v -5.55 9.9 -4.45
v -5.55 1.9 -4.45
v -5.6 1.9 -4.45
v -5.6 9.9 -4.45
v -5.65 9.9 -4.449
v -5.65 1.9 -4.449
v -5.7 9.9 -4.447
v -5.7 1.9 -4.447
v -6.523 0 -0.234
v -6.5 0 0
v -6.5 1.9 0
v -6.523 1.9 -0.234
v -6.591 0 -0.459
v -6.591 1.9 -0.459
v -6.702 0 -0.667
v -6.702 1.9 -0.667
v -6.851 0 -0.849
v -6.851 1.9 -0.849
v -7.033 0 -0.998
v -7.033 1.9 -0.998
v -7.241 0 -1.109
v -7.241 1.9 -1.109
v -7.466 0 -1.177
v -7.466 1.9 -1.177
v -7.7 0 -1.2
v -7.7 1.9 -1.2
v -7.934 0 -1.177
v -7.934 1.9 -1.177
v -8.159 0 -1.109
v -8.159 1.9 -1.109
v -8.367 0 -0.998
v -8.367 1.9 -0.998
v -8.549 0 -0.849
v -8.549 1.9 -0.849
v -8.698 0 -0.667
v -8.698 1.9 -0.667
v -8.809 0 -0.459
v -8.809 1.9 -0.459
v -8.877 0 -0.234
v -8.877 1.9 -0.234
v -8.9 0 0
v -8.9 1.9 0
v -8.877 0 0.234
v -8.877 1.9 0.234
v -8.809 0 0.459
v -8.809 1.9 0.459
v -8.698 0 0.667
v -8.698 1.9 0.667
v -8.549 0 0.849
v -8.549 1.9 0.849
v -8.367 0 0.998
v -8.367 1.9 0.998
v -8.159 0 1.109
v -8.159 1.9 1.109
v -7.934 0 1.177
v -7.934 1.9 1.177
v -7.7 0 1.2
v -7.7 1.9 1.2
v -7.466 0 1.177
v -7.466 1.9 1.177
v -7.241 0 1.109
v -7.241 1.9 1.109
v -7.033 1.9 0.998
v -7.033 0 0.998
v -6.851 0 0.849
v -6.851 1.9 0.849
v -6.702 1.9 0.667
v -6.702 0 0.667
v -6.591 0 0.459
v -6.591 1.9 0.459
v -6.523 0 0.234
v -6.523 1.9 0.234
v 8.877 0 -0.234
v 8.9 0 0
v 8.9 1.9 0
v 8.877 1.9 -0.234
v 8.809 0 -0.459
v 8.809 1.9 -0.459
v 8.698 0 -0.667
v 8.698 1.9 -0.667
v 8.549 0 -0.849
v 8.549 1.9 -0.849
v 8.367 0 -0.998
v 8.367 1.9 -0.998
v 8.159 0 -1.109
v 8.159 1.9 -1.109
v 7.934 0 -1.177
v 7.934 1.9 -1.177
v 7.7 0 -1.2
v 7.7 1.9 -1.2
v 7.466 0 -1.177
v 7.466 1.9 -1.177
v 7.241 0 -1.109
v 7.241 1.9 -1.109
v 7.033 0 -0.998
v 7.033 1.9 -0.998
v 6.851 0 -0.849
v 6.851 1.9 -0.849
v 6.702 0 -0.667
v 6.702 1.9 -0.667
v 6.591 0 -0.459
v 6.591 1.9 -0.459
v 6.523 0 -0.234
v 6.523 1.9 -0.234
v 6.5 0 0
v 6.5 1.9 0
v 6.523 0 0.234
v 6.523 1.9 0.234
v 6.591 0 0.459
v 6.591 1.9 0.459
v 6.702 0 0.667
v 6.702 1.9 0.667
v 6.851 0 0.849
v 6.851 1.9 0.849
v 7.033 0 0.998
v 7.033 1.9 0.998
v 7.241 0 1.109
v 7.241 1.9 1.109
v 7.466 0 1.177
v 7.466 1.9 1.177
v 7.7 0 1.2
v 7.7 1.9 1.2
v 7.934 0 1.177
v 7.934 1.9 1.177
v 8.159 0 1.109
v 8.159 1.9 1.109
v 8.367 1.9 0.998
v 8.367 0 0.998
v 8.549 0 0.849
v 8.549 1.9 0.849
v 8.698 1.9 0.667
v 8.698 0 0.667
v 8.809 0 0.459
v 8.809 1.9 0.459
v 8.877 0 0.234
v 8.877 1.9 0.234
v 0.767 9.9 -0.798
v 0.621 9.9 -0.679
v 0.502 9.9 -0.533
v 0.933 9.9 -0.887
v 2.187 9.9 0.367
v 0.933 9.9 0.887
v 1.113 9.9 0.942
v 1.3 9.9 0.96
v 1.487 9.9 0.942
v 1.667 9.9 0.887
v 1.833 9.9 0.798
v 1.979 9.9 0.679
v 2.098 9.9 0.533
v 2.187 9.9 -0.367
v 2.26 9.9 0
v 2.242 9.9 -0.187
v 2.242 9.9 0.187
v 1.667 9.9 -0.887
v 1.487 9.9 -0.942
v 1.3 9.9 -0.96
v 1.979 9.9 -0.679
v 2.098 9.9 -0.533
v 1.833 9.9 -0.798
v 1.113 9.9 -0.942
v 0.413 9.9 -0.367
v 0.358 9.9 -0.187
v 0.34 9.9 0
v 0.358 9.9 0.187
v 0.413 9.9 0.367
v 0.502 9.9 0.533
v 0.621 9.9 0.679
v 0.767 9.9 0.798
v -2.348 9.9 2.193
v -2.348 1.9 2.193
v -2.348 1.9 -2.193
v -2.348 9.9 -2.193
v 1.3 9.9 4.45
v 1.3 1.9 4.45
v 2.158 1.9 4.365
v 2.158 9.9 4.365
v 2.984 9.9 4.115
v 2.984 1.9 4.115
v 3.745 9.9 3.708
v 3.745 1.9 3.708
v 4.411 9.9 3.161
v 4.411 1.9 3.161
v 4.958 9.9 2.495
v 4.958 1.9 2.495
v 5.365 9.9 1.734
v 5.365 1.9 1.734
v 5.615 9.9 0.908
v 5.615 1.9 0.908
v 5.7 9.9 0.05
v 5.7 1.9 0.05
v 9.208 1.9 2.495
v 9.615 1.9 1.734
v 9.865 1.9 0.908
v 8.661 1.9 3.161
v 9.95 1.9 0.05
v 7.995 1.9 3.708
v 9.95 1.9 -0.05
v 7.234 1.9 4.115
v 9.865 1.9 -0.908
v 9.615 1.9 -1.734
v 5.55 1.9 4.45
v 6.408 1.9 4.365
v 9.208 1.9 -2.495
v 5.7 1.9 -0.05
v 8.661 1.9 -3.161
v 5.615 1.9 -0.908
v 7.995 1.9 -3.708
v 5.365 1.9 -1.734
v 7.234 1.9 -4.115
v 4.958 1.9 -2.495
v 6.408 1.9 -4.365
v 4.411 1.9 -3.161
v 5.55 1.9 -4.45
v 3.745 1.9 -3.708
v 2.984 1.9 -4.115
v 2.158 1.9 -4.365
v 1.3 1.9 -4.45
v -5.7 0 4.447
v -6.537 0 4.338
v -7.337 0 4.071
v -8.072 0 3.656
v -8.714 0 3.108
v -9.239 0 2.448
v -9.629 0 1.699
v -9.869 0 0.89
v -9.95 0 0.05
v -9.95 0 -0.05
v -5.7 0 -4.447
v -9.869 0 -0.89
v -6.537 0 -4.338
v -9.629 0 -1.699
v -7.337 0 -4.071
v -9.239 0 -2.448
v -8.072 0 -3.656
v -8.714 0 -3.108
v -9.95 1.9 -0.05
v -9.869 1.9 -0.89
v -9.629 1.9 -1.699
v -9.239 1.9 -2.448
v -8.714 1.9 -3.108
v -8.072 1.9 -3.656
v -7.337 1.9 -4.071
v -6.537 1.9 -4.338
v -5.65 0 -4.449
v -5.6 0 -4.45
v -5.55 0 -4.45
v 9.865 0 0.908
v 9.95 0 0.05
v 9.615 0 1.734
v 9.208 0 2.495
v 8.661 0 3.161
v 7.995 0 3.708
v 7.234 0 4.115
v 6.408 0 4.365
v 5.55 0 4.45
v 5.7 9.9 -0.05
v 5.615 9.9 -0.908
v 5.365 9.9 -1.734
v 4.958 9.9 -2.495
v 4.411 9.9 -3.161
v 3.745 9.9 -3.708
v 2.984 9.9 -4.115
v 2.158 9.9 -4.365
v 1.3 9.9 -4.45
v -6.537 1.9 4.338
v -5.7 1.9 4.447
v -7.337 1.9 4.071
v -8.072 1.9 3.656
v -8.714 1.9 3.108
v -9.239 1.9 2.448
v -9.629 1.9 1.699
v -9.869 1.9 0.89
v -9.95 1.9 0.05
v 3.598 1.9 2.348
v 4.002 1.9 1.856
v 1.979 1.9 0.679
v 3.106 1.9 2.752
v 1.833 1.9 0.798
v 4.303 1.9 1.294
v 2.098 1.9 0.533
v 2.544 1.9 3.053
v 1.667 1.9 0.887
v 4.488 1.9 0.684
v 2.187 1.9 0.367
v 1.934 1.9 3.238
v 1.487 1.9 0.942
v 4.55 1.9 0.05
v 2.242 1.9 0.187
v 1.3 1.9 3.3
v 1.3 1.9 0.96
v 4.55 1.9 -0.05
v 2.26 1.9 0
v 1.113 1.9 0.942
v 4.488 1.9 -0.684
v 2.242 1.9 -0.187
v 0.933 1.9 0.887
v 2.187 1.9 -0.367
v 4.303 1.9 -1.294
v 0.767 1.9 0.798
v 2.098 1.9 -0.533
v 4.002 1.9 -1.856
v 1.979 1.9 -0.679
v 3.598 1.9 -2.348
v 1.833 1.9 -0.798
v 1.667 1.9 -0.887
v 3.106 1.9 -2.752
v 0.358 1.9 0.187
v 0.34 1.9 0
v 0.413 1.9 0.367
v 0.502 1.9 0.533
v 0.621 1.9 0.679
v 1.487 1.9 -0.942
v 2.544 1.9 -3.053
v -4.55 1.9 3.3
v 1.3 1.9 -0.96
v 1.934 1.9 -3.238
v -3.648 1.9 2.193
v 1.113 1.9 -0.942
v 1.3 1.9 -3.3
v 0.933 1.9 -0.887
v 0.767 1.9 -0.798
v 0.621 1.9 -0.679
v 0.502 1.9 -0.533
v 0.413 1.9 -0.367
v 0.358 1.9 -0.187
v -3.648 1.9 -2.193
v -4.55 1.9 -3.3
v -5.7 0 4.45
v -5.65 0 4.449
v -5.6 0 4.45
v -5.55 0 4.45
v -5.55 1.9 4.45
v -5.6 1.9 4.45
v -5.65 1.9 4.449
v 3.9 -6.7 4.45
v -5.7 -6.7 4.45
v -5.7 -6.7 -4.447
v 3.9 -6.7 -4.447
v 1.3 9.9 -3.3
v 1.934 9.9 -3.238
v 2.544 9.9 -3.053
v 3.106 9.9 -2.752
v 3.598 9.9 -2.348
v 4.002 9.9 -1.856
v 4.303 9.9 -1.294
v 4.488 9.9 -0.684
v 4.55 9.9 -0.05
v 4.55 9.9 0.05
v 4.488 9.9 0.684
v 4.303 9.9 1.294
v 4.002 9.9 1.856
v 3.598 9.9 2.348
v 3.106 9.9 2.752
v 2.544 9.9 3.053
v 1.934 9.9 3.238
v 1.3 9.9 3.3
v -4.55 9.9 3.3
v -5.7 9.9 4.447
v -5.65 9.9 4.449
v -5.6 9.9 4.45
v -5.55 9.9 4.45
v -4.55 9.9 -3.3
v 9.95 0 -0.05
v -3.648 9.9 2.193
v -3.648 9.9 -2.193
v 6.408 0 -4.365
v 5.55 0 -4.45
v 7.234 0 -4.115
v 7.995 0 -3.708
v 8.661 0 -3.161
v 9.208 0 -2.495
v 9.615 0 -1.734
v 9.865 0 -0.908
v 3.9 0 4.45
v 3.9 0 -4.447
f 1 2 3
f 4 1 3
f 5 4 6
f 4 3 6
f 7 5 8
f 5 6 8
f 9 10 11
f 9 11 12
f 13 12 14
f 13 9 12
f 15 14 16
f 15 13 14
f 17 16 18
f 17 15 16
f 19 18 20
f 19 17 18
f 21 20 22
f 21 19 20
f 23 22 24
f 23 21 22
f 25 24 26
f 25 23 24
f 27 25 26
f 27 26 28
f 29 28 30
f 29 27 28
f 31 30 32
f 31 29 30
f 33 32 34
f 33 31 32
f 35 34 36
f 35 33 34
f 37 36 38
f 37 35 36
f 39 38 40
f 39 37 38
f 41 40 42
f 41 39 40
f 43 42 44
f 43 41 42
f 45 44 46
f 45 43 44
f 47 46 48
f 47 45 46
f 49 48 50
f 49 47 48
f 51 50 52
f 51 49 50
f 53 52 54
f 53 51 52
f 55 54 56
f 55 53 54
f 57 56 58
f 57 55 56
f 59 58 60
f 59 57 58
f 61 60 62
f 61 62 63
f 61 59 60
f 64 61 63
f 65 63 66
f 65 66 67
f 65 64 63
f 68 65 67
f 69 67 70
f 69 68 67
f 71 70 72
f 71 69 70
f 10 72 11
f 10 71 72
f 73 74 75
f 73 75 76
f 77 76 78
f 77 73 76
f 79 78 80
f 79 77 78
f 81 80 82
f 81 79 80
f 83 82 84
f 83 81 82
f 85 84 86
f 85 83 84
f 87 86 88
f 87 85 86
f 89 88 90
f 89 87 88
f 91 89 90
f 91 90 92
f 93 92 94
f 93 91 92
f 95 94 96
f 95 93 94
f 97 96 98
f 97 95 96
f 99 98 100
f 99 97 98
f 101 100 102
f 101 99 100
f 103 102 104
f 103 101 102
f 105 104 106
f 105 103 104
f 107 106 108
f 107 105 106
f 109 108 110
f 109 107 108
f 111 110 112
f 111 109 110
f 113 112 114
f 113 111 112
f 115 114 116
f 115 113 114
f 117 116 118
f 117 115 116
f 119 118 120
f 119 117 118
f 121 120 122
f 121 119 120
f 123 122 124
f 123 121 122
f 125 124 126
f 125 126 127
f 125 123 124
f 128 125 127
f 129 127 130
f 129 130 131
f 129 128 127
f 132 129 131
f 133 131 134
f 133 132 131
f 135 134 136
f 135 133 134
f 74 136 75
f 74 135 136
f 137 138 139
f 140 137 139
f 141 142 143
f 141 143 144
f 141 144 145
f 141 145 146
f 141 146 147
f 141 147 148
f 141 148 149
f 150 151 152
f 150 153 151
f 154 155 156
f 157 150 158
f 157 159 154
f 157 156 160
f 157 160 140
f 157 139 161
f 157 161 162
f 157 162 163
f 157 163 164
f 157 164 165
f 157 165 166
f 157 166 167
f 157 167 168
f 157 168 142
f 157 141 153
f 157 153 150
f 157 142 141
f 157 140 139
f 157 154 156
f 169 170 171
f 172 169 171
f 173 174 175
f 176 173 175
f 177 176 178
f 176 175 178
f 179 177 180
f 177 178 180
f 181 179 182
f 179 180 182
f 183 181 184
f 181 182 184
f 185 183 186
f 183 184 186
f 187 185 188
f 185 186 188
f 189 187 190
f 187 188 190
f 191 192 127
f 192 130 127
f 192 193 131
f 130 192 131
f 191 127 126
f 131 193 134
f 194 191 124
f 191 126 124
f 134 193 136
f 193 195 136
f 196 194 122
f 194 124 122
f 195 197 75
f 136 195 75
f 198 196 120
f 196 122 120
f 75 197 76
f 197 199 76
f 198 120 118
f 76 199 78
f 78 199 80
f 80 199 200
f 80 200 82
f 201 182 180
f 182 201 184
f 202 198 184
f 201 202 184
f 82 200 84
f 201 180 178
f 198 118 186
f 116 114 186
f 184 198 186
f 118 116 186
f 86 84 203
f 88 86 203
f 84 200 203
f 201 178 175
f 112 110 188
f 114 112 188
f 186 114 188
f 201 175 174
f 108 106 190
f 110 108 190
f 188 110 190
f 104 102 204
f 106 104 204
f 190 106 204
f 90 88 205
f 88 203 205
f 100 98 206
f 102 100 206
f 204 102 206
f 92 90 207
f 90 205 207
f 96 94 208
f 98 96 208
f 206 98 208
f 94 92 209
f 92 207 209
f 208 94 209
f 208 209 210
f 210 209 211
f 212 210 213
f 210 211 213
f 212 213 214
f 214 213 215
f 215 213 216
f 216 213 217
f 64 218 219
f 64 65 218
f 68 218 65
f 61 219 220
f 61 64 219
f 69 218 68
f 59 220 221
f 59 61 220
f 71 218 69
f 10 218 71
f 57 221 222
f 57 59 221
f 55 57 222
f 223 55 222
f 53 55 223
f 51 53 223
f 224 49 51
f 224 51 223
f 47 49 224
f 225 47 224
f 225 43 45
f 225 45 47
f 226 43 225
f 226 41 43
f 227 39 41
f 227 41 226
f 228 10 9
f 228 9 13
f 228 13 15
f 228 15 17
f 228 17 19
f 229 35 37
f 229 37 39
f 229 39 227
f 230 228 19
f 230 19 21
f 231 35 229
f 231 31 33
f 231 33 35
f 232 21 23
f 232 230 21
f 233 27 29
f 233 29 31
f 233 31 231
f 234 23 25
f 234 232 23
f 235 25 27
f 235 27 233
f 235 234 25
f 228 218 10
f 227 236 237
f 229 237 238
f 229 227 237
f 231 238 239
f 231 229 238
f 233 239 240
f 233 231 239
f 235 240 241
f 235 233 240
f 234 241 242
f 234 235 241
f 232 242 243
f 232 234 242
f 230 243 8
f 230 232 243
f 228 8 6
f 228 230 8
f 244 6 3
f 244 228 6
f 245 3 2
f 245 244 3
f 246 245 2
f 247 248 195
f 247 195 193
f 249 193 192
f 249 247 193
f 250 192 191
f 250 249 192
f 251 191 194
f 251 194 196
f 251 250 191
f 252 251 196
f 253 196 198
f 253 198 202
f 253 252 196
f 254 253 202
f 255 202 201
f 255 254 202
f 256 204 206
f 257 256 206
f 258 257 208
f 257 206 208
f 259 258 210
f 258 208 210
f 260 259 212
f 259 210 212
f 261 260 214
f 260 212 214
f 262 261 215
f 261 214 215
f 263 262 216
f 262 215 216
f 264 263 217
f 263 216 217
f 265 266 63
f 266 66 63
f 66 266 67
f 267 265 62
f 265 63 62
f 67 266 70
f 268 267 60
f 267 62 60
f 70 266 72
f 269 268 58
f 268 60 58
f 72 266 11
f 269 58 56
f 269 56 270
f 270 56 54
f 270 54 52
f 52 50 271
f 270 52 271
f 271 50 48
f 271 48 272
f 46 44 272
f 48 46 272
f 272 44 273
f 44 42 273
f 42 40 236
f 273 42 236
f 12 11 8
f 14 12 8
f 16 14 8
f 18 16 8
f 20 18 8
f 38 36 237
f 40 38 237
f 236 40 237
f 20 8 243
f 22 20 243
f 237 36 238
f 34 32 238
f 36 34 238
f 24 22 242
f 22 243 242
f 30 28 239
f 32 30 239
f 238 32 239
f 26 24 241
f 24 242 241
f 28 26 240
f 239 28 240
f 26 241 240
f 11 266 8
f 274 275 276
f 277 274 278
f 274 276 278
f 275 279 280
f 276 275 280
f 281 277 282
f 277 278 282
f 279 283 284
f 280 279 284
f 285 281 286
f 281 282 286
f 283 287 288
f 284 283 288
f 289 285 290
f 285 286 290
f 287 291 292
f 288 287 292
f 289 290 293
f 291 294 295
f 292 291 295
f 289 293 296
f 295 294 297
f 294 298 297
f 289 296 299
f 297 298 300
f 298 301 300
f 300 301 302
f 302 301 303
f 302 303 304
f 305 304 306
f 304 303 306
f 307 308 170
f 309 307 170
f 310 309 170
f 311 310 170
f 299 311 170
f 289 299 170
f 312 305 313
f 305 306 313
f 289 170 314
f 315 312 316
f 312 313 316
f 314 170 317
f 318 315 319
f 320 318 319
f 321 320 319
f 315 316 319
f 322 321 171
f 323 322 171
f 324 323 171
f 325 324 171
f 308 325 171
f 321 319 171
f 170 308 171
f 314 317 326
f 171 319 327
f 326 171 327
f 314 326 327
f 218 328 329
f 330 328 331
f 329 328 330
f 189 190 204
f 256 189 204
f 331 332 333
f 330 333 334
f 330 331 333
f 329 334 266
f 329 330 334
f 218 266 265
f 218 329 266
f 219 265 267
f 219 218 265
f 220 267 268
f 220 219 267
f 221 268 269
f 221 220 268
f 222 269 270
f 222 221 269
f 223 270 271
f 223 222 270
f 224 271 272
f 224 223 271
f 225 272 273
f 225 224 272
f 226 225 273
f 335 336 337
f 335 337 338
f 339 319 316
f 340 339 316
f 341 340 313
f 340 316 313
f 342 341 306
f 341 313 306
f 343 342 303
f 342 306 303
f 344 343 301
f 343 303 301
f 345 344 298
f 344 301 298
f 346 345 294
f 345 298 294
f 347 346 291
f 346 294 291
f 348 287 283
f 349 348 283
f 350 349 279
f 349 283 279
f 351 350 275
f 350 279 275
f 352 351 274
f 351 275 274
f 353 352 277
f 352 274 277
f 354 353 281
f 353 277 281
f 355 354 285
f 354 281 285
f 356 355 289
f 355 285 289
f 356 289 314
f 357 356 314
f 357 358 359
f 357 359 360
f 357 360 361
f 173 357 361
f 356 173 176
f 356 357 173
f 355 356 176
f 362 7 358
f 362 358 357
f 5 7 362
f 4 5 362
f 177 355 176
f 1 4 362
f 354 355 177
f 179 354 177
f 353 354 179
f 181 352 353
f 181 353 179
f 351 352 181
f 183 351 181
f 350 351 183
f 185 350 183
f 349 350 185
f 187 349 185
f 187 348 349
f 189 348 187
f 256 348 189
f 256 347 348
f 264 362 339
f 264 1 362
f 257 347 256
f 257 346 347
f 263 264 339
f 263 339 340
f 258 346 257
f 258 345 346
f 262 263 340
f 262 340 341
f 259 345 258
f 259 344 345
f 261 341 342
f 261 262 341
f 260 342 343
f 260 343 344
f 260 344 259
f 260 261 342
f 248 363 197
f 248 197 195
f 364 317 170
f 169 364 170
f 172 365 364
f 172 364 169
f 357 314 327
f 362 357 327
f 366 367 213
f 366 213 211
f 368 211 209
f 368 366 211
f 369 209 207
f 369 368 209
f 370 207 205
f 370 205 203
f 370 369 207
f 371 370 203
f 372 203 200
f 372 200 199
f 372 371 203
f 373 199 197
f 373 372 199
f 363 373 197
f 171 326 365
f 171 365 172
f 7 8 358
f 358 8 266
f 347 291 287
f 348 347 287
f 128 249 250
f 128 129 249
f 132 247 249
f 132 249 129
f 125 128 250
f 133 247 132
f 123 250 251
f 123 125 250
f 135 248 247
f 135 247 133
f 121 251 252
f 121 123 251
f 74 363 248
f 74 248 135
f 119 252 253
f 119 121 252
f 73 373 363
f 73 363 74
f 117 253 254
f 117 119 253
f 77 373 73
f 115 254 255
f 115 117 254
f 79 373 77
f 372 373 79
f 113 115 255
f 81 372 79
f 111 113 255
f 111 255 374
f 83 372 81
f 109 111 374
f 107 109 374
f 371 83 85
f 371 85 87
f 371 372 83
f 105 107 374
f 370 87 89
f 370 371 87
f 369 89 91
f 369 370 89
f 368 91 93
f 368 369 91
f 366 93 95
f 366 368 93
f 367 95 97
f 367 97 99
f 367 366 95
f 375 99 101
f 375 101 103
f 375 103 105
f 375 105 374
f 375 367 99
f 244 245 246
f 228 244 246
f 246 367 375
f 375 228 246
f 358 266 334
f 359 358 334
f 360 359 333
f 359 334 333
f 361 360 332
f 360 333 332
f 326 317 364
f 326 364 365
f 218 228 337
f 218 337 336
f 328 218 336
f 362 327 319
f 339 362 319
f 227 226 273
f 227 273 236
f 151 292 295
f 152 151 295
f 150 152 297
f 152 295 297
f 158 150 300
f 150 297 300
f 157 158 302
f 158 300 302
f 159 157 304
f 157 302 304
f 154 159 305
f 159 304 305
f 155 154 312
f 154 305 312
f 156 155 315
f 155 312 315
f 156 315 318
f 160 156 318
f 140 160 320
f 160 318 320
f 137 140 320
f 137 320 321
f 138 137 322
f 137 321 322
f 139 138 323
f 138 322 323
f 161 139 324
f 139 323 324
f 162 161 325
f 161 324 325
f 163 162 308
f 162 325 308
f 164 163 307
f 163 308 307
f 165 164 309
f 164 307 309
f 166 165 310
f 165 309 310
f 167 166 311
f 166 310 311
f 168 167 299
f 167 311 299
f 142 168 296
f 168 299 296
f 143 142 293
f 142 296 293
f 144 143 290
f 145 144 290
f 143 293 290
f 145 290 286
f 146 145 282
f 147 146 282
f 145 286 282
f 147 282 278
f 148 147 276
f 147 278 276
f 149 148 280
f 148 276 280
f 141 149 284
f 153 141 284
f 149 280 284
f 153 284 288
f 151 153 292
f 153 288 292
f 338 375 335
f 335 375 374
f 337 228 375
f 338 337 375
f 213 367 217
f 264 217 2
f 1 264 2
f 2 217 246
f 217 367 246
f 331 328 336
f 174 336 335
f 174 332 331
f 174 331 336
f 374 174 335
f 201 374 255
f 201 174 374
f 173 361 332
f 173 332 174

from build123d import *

# Parameters (mm, degrees)
SKETCH1_R           = 1.2
BOSS_EXTRUDE1_DEPTH = 1.9
SKETCH2_W           = 1.3
SKETCH2_H           = 4.38685961
SKETCH2_R           = 0.96
BOSS_EXTRUDE2_DEPTH = 8
SKETCH3_W           = 9.6
SKETCH3_H           = 8.897442439
BOSS_EXTRUDE3_DEPTH = 6.7


with BuildPart() as part:
    # Sketch1 → Boss-Extrude1 (new body)
    with BuildSketch(Plane(origin=(0, 0, 0), x_dir=(1, 0, 0), z_dir=(0, 1, 0))):
        with BuildLine():
            Line((-5.55, 4.45), (5.55, 4.45))
            ThreePointArc((5.55, 4.45), (8.661269837, 3.161269837), (9.95, 0.05))
            Line((9.95, 0.05), (9.95, -0.05))
            ThreePointArc((9.95, -0.05), (8.661269837, -3.161269837), (5.55, -4.45))
            Line((5.55, -4.45), (-5.55, -4.45))
            ThreePointArc((-5.55, -4.45), (-8.661269837, -3.161269837), (-9.95, -0.05))
            Line((-9.95, -0.05), (-9.95, 0.05))
            ThreePointArc((-9.95, 0.05), (-8.661269837, 3.161269837), (-5.55, 4.45))
        make_face()
        with Locations((-7.7, 0)):
            Circle(SKETCH1_R, mode=Mode.SUBTRACT)
        with Locations((7.7, 0)):
            Circle(SKETCH1_R, mode=Mode.SUBTRACT)
    extrude(amount=BOSS_EXTRUDE1_DEPTH)

    # Sketch2 → Boss-Extrude2 (add)
    with BuildSketch(Plane(origin=(0, 1.9, 0), x_dir=(1, 0, 0), z_dir=(0, 1, 0))):
        with BuildLine():
            Line((1.3, 4.45), (-5.55, 4.45))
            ThreePointArc((-5.55, 4.45), (-5.625010901, 4.449360563), (-5.7, 4.447442439))
            Line((-5.7, 4.447442439), (-5.7, -4.447442439))
            ThreePointArc((-5.7, -4.447442439), (-5.625010901, -4.449360563), (-5.55, -4.45))
            Line((-5.55, -4.45), (1.3, -4.45))
            ThreePointArc((1.3, -4.45), (4.411269837, -3.161269837), (5.7, -0.05))
            Line((5.7, -0.05), (5.7, 0.05))
            ThreePointArc((5.7, 0.05), (4.411269837, 3.161269837), (1.3, 4.45))
        make_face()
        with BuildLine():
            Line((-4.55, -3.3), (-4.55, 3.3))
            Line((-4.55, 3.3), (1.3, 3.3))
            ThreePointArc((1.3, 3.3), (3.598097039, 2.348097039), (4.55, 0.05))
            Line((4.55, 0.05), (4.55, -0.05))
            ThreePointArc((4.55, -0.05), (3.598097039, -2.348097039), (1.3, -3.3))
            Line((1.3, -3.3), (-4.55, -3.3))
        make_face(mode=Mode.SUBTRACT)
        with Locations((-2.99802734, 0)):
            Rectangle(SKETCH2_W, SKETCH2_H)
        with Locations((1.3, 0)):
            Circle(SKETCH2_R)
    extrude(amount=BOSS_EXTRUDE2_DEPTH)

    # Sketch3 → Boss-Extrude3 (add)
    with BuildSketch(Plane.XZ):
        with Locations((-0.9, 0.00127878)):
            Rectangle(SKETCH3_W, SKETCH3_H)
    extrude(amount=BOSS_EXTRUDE3_DEPTH)


solid = part.part
